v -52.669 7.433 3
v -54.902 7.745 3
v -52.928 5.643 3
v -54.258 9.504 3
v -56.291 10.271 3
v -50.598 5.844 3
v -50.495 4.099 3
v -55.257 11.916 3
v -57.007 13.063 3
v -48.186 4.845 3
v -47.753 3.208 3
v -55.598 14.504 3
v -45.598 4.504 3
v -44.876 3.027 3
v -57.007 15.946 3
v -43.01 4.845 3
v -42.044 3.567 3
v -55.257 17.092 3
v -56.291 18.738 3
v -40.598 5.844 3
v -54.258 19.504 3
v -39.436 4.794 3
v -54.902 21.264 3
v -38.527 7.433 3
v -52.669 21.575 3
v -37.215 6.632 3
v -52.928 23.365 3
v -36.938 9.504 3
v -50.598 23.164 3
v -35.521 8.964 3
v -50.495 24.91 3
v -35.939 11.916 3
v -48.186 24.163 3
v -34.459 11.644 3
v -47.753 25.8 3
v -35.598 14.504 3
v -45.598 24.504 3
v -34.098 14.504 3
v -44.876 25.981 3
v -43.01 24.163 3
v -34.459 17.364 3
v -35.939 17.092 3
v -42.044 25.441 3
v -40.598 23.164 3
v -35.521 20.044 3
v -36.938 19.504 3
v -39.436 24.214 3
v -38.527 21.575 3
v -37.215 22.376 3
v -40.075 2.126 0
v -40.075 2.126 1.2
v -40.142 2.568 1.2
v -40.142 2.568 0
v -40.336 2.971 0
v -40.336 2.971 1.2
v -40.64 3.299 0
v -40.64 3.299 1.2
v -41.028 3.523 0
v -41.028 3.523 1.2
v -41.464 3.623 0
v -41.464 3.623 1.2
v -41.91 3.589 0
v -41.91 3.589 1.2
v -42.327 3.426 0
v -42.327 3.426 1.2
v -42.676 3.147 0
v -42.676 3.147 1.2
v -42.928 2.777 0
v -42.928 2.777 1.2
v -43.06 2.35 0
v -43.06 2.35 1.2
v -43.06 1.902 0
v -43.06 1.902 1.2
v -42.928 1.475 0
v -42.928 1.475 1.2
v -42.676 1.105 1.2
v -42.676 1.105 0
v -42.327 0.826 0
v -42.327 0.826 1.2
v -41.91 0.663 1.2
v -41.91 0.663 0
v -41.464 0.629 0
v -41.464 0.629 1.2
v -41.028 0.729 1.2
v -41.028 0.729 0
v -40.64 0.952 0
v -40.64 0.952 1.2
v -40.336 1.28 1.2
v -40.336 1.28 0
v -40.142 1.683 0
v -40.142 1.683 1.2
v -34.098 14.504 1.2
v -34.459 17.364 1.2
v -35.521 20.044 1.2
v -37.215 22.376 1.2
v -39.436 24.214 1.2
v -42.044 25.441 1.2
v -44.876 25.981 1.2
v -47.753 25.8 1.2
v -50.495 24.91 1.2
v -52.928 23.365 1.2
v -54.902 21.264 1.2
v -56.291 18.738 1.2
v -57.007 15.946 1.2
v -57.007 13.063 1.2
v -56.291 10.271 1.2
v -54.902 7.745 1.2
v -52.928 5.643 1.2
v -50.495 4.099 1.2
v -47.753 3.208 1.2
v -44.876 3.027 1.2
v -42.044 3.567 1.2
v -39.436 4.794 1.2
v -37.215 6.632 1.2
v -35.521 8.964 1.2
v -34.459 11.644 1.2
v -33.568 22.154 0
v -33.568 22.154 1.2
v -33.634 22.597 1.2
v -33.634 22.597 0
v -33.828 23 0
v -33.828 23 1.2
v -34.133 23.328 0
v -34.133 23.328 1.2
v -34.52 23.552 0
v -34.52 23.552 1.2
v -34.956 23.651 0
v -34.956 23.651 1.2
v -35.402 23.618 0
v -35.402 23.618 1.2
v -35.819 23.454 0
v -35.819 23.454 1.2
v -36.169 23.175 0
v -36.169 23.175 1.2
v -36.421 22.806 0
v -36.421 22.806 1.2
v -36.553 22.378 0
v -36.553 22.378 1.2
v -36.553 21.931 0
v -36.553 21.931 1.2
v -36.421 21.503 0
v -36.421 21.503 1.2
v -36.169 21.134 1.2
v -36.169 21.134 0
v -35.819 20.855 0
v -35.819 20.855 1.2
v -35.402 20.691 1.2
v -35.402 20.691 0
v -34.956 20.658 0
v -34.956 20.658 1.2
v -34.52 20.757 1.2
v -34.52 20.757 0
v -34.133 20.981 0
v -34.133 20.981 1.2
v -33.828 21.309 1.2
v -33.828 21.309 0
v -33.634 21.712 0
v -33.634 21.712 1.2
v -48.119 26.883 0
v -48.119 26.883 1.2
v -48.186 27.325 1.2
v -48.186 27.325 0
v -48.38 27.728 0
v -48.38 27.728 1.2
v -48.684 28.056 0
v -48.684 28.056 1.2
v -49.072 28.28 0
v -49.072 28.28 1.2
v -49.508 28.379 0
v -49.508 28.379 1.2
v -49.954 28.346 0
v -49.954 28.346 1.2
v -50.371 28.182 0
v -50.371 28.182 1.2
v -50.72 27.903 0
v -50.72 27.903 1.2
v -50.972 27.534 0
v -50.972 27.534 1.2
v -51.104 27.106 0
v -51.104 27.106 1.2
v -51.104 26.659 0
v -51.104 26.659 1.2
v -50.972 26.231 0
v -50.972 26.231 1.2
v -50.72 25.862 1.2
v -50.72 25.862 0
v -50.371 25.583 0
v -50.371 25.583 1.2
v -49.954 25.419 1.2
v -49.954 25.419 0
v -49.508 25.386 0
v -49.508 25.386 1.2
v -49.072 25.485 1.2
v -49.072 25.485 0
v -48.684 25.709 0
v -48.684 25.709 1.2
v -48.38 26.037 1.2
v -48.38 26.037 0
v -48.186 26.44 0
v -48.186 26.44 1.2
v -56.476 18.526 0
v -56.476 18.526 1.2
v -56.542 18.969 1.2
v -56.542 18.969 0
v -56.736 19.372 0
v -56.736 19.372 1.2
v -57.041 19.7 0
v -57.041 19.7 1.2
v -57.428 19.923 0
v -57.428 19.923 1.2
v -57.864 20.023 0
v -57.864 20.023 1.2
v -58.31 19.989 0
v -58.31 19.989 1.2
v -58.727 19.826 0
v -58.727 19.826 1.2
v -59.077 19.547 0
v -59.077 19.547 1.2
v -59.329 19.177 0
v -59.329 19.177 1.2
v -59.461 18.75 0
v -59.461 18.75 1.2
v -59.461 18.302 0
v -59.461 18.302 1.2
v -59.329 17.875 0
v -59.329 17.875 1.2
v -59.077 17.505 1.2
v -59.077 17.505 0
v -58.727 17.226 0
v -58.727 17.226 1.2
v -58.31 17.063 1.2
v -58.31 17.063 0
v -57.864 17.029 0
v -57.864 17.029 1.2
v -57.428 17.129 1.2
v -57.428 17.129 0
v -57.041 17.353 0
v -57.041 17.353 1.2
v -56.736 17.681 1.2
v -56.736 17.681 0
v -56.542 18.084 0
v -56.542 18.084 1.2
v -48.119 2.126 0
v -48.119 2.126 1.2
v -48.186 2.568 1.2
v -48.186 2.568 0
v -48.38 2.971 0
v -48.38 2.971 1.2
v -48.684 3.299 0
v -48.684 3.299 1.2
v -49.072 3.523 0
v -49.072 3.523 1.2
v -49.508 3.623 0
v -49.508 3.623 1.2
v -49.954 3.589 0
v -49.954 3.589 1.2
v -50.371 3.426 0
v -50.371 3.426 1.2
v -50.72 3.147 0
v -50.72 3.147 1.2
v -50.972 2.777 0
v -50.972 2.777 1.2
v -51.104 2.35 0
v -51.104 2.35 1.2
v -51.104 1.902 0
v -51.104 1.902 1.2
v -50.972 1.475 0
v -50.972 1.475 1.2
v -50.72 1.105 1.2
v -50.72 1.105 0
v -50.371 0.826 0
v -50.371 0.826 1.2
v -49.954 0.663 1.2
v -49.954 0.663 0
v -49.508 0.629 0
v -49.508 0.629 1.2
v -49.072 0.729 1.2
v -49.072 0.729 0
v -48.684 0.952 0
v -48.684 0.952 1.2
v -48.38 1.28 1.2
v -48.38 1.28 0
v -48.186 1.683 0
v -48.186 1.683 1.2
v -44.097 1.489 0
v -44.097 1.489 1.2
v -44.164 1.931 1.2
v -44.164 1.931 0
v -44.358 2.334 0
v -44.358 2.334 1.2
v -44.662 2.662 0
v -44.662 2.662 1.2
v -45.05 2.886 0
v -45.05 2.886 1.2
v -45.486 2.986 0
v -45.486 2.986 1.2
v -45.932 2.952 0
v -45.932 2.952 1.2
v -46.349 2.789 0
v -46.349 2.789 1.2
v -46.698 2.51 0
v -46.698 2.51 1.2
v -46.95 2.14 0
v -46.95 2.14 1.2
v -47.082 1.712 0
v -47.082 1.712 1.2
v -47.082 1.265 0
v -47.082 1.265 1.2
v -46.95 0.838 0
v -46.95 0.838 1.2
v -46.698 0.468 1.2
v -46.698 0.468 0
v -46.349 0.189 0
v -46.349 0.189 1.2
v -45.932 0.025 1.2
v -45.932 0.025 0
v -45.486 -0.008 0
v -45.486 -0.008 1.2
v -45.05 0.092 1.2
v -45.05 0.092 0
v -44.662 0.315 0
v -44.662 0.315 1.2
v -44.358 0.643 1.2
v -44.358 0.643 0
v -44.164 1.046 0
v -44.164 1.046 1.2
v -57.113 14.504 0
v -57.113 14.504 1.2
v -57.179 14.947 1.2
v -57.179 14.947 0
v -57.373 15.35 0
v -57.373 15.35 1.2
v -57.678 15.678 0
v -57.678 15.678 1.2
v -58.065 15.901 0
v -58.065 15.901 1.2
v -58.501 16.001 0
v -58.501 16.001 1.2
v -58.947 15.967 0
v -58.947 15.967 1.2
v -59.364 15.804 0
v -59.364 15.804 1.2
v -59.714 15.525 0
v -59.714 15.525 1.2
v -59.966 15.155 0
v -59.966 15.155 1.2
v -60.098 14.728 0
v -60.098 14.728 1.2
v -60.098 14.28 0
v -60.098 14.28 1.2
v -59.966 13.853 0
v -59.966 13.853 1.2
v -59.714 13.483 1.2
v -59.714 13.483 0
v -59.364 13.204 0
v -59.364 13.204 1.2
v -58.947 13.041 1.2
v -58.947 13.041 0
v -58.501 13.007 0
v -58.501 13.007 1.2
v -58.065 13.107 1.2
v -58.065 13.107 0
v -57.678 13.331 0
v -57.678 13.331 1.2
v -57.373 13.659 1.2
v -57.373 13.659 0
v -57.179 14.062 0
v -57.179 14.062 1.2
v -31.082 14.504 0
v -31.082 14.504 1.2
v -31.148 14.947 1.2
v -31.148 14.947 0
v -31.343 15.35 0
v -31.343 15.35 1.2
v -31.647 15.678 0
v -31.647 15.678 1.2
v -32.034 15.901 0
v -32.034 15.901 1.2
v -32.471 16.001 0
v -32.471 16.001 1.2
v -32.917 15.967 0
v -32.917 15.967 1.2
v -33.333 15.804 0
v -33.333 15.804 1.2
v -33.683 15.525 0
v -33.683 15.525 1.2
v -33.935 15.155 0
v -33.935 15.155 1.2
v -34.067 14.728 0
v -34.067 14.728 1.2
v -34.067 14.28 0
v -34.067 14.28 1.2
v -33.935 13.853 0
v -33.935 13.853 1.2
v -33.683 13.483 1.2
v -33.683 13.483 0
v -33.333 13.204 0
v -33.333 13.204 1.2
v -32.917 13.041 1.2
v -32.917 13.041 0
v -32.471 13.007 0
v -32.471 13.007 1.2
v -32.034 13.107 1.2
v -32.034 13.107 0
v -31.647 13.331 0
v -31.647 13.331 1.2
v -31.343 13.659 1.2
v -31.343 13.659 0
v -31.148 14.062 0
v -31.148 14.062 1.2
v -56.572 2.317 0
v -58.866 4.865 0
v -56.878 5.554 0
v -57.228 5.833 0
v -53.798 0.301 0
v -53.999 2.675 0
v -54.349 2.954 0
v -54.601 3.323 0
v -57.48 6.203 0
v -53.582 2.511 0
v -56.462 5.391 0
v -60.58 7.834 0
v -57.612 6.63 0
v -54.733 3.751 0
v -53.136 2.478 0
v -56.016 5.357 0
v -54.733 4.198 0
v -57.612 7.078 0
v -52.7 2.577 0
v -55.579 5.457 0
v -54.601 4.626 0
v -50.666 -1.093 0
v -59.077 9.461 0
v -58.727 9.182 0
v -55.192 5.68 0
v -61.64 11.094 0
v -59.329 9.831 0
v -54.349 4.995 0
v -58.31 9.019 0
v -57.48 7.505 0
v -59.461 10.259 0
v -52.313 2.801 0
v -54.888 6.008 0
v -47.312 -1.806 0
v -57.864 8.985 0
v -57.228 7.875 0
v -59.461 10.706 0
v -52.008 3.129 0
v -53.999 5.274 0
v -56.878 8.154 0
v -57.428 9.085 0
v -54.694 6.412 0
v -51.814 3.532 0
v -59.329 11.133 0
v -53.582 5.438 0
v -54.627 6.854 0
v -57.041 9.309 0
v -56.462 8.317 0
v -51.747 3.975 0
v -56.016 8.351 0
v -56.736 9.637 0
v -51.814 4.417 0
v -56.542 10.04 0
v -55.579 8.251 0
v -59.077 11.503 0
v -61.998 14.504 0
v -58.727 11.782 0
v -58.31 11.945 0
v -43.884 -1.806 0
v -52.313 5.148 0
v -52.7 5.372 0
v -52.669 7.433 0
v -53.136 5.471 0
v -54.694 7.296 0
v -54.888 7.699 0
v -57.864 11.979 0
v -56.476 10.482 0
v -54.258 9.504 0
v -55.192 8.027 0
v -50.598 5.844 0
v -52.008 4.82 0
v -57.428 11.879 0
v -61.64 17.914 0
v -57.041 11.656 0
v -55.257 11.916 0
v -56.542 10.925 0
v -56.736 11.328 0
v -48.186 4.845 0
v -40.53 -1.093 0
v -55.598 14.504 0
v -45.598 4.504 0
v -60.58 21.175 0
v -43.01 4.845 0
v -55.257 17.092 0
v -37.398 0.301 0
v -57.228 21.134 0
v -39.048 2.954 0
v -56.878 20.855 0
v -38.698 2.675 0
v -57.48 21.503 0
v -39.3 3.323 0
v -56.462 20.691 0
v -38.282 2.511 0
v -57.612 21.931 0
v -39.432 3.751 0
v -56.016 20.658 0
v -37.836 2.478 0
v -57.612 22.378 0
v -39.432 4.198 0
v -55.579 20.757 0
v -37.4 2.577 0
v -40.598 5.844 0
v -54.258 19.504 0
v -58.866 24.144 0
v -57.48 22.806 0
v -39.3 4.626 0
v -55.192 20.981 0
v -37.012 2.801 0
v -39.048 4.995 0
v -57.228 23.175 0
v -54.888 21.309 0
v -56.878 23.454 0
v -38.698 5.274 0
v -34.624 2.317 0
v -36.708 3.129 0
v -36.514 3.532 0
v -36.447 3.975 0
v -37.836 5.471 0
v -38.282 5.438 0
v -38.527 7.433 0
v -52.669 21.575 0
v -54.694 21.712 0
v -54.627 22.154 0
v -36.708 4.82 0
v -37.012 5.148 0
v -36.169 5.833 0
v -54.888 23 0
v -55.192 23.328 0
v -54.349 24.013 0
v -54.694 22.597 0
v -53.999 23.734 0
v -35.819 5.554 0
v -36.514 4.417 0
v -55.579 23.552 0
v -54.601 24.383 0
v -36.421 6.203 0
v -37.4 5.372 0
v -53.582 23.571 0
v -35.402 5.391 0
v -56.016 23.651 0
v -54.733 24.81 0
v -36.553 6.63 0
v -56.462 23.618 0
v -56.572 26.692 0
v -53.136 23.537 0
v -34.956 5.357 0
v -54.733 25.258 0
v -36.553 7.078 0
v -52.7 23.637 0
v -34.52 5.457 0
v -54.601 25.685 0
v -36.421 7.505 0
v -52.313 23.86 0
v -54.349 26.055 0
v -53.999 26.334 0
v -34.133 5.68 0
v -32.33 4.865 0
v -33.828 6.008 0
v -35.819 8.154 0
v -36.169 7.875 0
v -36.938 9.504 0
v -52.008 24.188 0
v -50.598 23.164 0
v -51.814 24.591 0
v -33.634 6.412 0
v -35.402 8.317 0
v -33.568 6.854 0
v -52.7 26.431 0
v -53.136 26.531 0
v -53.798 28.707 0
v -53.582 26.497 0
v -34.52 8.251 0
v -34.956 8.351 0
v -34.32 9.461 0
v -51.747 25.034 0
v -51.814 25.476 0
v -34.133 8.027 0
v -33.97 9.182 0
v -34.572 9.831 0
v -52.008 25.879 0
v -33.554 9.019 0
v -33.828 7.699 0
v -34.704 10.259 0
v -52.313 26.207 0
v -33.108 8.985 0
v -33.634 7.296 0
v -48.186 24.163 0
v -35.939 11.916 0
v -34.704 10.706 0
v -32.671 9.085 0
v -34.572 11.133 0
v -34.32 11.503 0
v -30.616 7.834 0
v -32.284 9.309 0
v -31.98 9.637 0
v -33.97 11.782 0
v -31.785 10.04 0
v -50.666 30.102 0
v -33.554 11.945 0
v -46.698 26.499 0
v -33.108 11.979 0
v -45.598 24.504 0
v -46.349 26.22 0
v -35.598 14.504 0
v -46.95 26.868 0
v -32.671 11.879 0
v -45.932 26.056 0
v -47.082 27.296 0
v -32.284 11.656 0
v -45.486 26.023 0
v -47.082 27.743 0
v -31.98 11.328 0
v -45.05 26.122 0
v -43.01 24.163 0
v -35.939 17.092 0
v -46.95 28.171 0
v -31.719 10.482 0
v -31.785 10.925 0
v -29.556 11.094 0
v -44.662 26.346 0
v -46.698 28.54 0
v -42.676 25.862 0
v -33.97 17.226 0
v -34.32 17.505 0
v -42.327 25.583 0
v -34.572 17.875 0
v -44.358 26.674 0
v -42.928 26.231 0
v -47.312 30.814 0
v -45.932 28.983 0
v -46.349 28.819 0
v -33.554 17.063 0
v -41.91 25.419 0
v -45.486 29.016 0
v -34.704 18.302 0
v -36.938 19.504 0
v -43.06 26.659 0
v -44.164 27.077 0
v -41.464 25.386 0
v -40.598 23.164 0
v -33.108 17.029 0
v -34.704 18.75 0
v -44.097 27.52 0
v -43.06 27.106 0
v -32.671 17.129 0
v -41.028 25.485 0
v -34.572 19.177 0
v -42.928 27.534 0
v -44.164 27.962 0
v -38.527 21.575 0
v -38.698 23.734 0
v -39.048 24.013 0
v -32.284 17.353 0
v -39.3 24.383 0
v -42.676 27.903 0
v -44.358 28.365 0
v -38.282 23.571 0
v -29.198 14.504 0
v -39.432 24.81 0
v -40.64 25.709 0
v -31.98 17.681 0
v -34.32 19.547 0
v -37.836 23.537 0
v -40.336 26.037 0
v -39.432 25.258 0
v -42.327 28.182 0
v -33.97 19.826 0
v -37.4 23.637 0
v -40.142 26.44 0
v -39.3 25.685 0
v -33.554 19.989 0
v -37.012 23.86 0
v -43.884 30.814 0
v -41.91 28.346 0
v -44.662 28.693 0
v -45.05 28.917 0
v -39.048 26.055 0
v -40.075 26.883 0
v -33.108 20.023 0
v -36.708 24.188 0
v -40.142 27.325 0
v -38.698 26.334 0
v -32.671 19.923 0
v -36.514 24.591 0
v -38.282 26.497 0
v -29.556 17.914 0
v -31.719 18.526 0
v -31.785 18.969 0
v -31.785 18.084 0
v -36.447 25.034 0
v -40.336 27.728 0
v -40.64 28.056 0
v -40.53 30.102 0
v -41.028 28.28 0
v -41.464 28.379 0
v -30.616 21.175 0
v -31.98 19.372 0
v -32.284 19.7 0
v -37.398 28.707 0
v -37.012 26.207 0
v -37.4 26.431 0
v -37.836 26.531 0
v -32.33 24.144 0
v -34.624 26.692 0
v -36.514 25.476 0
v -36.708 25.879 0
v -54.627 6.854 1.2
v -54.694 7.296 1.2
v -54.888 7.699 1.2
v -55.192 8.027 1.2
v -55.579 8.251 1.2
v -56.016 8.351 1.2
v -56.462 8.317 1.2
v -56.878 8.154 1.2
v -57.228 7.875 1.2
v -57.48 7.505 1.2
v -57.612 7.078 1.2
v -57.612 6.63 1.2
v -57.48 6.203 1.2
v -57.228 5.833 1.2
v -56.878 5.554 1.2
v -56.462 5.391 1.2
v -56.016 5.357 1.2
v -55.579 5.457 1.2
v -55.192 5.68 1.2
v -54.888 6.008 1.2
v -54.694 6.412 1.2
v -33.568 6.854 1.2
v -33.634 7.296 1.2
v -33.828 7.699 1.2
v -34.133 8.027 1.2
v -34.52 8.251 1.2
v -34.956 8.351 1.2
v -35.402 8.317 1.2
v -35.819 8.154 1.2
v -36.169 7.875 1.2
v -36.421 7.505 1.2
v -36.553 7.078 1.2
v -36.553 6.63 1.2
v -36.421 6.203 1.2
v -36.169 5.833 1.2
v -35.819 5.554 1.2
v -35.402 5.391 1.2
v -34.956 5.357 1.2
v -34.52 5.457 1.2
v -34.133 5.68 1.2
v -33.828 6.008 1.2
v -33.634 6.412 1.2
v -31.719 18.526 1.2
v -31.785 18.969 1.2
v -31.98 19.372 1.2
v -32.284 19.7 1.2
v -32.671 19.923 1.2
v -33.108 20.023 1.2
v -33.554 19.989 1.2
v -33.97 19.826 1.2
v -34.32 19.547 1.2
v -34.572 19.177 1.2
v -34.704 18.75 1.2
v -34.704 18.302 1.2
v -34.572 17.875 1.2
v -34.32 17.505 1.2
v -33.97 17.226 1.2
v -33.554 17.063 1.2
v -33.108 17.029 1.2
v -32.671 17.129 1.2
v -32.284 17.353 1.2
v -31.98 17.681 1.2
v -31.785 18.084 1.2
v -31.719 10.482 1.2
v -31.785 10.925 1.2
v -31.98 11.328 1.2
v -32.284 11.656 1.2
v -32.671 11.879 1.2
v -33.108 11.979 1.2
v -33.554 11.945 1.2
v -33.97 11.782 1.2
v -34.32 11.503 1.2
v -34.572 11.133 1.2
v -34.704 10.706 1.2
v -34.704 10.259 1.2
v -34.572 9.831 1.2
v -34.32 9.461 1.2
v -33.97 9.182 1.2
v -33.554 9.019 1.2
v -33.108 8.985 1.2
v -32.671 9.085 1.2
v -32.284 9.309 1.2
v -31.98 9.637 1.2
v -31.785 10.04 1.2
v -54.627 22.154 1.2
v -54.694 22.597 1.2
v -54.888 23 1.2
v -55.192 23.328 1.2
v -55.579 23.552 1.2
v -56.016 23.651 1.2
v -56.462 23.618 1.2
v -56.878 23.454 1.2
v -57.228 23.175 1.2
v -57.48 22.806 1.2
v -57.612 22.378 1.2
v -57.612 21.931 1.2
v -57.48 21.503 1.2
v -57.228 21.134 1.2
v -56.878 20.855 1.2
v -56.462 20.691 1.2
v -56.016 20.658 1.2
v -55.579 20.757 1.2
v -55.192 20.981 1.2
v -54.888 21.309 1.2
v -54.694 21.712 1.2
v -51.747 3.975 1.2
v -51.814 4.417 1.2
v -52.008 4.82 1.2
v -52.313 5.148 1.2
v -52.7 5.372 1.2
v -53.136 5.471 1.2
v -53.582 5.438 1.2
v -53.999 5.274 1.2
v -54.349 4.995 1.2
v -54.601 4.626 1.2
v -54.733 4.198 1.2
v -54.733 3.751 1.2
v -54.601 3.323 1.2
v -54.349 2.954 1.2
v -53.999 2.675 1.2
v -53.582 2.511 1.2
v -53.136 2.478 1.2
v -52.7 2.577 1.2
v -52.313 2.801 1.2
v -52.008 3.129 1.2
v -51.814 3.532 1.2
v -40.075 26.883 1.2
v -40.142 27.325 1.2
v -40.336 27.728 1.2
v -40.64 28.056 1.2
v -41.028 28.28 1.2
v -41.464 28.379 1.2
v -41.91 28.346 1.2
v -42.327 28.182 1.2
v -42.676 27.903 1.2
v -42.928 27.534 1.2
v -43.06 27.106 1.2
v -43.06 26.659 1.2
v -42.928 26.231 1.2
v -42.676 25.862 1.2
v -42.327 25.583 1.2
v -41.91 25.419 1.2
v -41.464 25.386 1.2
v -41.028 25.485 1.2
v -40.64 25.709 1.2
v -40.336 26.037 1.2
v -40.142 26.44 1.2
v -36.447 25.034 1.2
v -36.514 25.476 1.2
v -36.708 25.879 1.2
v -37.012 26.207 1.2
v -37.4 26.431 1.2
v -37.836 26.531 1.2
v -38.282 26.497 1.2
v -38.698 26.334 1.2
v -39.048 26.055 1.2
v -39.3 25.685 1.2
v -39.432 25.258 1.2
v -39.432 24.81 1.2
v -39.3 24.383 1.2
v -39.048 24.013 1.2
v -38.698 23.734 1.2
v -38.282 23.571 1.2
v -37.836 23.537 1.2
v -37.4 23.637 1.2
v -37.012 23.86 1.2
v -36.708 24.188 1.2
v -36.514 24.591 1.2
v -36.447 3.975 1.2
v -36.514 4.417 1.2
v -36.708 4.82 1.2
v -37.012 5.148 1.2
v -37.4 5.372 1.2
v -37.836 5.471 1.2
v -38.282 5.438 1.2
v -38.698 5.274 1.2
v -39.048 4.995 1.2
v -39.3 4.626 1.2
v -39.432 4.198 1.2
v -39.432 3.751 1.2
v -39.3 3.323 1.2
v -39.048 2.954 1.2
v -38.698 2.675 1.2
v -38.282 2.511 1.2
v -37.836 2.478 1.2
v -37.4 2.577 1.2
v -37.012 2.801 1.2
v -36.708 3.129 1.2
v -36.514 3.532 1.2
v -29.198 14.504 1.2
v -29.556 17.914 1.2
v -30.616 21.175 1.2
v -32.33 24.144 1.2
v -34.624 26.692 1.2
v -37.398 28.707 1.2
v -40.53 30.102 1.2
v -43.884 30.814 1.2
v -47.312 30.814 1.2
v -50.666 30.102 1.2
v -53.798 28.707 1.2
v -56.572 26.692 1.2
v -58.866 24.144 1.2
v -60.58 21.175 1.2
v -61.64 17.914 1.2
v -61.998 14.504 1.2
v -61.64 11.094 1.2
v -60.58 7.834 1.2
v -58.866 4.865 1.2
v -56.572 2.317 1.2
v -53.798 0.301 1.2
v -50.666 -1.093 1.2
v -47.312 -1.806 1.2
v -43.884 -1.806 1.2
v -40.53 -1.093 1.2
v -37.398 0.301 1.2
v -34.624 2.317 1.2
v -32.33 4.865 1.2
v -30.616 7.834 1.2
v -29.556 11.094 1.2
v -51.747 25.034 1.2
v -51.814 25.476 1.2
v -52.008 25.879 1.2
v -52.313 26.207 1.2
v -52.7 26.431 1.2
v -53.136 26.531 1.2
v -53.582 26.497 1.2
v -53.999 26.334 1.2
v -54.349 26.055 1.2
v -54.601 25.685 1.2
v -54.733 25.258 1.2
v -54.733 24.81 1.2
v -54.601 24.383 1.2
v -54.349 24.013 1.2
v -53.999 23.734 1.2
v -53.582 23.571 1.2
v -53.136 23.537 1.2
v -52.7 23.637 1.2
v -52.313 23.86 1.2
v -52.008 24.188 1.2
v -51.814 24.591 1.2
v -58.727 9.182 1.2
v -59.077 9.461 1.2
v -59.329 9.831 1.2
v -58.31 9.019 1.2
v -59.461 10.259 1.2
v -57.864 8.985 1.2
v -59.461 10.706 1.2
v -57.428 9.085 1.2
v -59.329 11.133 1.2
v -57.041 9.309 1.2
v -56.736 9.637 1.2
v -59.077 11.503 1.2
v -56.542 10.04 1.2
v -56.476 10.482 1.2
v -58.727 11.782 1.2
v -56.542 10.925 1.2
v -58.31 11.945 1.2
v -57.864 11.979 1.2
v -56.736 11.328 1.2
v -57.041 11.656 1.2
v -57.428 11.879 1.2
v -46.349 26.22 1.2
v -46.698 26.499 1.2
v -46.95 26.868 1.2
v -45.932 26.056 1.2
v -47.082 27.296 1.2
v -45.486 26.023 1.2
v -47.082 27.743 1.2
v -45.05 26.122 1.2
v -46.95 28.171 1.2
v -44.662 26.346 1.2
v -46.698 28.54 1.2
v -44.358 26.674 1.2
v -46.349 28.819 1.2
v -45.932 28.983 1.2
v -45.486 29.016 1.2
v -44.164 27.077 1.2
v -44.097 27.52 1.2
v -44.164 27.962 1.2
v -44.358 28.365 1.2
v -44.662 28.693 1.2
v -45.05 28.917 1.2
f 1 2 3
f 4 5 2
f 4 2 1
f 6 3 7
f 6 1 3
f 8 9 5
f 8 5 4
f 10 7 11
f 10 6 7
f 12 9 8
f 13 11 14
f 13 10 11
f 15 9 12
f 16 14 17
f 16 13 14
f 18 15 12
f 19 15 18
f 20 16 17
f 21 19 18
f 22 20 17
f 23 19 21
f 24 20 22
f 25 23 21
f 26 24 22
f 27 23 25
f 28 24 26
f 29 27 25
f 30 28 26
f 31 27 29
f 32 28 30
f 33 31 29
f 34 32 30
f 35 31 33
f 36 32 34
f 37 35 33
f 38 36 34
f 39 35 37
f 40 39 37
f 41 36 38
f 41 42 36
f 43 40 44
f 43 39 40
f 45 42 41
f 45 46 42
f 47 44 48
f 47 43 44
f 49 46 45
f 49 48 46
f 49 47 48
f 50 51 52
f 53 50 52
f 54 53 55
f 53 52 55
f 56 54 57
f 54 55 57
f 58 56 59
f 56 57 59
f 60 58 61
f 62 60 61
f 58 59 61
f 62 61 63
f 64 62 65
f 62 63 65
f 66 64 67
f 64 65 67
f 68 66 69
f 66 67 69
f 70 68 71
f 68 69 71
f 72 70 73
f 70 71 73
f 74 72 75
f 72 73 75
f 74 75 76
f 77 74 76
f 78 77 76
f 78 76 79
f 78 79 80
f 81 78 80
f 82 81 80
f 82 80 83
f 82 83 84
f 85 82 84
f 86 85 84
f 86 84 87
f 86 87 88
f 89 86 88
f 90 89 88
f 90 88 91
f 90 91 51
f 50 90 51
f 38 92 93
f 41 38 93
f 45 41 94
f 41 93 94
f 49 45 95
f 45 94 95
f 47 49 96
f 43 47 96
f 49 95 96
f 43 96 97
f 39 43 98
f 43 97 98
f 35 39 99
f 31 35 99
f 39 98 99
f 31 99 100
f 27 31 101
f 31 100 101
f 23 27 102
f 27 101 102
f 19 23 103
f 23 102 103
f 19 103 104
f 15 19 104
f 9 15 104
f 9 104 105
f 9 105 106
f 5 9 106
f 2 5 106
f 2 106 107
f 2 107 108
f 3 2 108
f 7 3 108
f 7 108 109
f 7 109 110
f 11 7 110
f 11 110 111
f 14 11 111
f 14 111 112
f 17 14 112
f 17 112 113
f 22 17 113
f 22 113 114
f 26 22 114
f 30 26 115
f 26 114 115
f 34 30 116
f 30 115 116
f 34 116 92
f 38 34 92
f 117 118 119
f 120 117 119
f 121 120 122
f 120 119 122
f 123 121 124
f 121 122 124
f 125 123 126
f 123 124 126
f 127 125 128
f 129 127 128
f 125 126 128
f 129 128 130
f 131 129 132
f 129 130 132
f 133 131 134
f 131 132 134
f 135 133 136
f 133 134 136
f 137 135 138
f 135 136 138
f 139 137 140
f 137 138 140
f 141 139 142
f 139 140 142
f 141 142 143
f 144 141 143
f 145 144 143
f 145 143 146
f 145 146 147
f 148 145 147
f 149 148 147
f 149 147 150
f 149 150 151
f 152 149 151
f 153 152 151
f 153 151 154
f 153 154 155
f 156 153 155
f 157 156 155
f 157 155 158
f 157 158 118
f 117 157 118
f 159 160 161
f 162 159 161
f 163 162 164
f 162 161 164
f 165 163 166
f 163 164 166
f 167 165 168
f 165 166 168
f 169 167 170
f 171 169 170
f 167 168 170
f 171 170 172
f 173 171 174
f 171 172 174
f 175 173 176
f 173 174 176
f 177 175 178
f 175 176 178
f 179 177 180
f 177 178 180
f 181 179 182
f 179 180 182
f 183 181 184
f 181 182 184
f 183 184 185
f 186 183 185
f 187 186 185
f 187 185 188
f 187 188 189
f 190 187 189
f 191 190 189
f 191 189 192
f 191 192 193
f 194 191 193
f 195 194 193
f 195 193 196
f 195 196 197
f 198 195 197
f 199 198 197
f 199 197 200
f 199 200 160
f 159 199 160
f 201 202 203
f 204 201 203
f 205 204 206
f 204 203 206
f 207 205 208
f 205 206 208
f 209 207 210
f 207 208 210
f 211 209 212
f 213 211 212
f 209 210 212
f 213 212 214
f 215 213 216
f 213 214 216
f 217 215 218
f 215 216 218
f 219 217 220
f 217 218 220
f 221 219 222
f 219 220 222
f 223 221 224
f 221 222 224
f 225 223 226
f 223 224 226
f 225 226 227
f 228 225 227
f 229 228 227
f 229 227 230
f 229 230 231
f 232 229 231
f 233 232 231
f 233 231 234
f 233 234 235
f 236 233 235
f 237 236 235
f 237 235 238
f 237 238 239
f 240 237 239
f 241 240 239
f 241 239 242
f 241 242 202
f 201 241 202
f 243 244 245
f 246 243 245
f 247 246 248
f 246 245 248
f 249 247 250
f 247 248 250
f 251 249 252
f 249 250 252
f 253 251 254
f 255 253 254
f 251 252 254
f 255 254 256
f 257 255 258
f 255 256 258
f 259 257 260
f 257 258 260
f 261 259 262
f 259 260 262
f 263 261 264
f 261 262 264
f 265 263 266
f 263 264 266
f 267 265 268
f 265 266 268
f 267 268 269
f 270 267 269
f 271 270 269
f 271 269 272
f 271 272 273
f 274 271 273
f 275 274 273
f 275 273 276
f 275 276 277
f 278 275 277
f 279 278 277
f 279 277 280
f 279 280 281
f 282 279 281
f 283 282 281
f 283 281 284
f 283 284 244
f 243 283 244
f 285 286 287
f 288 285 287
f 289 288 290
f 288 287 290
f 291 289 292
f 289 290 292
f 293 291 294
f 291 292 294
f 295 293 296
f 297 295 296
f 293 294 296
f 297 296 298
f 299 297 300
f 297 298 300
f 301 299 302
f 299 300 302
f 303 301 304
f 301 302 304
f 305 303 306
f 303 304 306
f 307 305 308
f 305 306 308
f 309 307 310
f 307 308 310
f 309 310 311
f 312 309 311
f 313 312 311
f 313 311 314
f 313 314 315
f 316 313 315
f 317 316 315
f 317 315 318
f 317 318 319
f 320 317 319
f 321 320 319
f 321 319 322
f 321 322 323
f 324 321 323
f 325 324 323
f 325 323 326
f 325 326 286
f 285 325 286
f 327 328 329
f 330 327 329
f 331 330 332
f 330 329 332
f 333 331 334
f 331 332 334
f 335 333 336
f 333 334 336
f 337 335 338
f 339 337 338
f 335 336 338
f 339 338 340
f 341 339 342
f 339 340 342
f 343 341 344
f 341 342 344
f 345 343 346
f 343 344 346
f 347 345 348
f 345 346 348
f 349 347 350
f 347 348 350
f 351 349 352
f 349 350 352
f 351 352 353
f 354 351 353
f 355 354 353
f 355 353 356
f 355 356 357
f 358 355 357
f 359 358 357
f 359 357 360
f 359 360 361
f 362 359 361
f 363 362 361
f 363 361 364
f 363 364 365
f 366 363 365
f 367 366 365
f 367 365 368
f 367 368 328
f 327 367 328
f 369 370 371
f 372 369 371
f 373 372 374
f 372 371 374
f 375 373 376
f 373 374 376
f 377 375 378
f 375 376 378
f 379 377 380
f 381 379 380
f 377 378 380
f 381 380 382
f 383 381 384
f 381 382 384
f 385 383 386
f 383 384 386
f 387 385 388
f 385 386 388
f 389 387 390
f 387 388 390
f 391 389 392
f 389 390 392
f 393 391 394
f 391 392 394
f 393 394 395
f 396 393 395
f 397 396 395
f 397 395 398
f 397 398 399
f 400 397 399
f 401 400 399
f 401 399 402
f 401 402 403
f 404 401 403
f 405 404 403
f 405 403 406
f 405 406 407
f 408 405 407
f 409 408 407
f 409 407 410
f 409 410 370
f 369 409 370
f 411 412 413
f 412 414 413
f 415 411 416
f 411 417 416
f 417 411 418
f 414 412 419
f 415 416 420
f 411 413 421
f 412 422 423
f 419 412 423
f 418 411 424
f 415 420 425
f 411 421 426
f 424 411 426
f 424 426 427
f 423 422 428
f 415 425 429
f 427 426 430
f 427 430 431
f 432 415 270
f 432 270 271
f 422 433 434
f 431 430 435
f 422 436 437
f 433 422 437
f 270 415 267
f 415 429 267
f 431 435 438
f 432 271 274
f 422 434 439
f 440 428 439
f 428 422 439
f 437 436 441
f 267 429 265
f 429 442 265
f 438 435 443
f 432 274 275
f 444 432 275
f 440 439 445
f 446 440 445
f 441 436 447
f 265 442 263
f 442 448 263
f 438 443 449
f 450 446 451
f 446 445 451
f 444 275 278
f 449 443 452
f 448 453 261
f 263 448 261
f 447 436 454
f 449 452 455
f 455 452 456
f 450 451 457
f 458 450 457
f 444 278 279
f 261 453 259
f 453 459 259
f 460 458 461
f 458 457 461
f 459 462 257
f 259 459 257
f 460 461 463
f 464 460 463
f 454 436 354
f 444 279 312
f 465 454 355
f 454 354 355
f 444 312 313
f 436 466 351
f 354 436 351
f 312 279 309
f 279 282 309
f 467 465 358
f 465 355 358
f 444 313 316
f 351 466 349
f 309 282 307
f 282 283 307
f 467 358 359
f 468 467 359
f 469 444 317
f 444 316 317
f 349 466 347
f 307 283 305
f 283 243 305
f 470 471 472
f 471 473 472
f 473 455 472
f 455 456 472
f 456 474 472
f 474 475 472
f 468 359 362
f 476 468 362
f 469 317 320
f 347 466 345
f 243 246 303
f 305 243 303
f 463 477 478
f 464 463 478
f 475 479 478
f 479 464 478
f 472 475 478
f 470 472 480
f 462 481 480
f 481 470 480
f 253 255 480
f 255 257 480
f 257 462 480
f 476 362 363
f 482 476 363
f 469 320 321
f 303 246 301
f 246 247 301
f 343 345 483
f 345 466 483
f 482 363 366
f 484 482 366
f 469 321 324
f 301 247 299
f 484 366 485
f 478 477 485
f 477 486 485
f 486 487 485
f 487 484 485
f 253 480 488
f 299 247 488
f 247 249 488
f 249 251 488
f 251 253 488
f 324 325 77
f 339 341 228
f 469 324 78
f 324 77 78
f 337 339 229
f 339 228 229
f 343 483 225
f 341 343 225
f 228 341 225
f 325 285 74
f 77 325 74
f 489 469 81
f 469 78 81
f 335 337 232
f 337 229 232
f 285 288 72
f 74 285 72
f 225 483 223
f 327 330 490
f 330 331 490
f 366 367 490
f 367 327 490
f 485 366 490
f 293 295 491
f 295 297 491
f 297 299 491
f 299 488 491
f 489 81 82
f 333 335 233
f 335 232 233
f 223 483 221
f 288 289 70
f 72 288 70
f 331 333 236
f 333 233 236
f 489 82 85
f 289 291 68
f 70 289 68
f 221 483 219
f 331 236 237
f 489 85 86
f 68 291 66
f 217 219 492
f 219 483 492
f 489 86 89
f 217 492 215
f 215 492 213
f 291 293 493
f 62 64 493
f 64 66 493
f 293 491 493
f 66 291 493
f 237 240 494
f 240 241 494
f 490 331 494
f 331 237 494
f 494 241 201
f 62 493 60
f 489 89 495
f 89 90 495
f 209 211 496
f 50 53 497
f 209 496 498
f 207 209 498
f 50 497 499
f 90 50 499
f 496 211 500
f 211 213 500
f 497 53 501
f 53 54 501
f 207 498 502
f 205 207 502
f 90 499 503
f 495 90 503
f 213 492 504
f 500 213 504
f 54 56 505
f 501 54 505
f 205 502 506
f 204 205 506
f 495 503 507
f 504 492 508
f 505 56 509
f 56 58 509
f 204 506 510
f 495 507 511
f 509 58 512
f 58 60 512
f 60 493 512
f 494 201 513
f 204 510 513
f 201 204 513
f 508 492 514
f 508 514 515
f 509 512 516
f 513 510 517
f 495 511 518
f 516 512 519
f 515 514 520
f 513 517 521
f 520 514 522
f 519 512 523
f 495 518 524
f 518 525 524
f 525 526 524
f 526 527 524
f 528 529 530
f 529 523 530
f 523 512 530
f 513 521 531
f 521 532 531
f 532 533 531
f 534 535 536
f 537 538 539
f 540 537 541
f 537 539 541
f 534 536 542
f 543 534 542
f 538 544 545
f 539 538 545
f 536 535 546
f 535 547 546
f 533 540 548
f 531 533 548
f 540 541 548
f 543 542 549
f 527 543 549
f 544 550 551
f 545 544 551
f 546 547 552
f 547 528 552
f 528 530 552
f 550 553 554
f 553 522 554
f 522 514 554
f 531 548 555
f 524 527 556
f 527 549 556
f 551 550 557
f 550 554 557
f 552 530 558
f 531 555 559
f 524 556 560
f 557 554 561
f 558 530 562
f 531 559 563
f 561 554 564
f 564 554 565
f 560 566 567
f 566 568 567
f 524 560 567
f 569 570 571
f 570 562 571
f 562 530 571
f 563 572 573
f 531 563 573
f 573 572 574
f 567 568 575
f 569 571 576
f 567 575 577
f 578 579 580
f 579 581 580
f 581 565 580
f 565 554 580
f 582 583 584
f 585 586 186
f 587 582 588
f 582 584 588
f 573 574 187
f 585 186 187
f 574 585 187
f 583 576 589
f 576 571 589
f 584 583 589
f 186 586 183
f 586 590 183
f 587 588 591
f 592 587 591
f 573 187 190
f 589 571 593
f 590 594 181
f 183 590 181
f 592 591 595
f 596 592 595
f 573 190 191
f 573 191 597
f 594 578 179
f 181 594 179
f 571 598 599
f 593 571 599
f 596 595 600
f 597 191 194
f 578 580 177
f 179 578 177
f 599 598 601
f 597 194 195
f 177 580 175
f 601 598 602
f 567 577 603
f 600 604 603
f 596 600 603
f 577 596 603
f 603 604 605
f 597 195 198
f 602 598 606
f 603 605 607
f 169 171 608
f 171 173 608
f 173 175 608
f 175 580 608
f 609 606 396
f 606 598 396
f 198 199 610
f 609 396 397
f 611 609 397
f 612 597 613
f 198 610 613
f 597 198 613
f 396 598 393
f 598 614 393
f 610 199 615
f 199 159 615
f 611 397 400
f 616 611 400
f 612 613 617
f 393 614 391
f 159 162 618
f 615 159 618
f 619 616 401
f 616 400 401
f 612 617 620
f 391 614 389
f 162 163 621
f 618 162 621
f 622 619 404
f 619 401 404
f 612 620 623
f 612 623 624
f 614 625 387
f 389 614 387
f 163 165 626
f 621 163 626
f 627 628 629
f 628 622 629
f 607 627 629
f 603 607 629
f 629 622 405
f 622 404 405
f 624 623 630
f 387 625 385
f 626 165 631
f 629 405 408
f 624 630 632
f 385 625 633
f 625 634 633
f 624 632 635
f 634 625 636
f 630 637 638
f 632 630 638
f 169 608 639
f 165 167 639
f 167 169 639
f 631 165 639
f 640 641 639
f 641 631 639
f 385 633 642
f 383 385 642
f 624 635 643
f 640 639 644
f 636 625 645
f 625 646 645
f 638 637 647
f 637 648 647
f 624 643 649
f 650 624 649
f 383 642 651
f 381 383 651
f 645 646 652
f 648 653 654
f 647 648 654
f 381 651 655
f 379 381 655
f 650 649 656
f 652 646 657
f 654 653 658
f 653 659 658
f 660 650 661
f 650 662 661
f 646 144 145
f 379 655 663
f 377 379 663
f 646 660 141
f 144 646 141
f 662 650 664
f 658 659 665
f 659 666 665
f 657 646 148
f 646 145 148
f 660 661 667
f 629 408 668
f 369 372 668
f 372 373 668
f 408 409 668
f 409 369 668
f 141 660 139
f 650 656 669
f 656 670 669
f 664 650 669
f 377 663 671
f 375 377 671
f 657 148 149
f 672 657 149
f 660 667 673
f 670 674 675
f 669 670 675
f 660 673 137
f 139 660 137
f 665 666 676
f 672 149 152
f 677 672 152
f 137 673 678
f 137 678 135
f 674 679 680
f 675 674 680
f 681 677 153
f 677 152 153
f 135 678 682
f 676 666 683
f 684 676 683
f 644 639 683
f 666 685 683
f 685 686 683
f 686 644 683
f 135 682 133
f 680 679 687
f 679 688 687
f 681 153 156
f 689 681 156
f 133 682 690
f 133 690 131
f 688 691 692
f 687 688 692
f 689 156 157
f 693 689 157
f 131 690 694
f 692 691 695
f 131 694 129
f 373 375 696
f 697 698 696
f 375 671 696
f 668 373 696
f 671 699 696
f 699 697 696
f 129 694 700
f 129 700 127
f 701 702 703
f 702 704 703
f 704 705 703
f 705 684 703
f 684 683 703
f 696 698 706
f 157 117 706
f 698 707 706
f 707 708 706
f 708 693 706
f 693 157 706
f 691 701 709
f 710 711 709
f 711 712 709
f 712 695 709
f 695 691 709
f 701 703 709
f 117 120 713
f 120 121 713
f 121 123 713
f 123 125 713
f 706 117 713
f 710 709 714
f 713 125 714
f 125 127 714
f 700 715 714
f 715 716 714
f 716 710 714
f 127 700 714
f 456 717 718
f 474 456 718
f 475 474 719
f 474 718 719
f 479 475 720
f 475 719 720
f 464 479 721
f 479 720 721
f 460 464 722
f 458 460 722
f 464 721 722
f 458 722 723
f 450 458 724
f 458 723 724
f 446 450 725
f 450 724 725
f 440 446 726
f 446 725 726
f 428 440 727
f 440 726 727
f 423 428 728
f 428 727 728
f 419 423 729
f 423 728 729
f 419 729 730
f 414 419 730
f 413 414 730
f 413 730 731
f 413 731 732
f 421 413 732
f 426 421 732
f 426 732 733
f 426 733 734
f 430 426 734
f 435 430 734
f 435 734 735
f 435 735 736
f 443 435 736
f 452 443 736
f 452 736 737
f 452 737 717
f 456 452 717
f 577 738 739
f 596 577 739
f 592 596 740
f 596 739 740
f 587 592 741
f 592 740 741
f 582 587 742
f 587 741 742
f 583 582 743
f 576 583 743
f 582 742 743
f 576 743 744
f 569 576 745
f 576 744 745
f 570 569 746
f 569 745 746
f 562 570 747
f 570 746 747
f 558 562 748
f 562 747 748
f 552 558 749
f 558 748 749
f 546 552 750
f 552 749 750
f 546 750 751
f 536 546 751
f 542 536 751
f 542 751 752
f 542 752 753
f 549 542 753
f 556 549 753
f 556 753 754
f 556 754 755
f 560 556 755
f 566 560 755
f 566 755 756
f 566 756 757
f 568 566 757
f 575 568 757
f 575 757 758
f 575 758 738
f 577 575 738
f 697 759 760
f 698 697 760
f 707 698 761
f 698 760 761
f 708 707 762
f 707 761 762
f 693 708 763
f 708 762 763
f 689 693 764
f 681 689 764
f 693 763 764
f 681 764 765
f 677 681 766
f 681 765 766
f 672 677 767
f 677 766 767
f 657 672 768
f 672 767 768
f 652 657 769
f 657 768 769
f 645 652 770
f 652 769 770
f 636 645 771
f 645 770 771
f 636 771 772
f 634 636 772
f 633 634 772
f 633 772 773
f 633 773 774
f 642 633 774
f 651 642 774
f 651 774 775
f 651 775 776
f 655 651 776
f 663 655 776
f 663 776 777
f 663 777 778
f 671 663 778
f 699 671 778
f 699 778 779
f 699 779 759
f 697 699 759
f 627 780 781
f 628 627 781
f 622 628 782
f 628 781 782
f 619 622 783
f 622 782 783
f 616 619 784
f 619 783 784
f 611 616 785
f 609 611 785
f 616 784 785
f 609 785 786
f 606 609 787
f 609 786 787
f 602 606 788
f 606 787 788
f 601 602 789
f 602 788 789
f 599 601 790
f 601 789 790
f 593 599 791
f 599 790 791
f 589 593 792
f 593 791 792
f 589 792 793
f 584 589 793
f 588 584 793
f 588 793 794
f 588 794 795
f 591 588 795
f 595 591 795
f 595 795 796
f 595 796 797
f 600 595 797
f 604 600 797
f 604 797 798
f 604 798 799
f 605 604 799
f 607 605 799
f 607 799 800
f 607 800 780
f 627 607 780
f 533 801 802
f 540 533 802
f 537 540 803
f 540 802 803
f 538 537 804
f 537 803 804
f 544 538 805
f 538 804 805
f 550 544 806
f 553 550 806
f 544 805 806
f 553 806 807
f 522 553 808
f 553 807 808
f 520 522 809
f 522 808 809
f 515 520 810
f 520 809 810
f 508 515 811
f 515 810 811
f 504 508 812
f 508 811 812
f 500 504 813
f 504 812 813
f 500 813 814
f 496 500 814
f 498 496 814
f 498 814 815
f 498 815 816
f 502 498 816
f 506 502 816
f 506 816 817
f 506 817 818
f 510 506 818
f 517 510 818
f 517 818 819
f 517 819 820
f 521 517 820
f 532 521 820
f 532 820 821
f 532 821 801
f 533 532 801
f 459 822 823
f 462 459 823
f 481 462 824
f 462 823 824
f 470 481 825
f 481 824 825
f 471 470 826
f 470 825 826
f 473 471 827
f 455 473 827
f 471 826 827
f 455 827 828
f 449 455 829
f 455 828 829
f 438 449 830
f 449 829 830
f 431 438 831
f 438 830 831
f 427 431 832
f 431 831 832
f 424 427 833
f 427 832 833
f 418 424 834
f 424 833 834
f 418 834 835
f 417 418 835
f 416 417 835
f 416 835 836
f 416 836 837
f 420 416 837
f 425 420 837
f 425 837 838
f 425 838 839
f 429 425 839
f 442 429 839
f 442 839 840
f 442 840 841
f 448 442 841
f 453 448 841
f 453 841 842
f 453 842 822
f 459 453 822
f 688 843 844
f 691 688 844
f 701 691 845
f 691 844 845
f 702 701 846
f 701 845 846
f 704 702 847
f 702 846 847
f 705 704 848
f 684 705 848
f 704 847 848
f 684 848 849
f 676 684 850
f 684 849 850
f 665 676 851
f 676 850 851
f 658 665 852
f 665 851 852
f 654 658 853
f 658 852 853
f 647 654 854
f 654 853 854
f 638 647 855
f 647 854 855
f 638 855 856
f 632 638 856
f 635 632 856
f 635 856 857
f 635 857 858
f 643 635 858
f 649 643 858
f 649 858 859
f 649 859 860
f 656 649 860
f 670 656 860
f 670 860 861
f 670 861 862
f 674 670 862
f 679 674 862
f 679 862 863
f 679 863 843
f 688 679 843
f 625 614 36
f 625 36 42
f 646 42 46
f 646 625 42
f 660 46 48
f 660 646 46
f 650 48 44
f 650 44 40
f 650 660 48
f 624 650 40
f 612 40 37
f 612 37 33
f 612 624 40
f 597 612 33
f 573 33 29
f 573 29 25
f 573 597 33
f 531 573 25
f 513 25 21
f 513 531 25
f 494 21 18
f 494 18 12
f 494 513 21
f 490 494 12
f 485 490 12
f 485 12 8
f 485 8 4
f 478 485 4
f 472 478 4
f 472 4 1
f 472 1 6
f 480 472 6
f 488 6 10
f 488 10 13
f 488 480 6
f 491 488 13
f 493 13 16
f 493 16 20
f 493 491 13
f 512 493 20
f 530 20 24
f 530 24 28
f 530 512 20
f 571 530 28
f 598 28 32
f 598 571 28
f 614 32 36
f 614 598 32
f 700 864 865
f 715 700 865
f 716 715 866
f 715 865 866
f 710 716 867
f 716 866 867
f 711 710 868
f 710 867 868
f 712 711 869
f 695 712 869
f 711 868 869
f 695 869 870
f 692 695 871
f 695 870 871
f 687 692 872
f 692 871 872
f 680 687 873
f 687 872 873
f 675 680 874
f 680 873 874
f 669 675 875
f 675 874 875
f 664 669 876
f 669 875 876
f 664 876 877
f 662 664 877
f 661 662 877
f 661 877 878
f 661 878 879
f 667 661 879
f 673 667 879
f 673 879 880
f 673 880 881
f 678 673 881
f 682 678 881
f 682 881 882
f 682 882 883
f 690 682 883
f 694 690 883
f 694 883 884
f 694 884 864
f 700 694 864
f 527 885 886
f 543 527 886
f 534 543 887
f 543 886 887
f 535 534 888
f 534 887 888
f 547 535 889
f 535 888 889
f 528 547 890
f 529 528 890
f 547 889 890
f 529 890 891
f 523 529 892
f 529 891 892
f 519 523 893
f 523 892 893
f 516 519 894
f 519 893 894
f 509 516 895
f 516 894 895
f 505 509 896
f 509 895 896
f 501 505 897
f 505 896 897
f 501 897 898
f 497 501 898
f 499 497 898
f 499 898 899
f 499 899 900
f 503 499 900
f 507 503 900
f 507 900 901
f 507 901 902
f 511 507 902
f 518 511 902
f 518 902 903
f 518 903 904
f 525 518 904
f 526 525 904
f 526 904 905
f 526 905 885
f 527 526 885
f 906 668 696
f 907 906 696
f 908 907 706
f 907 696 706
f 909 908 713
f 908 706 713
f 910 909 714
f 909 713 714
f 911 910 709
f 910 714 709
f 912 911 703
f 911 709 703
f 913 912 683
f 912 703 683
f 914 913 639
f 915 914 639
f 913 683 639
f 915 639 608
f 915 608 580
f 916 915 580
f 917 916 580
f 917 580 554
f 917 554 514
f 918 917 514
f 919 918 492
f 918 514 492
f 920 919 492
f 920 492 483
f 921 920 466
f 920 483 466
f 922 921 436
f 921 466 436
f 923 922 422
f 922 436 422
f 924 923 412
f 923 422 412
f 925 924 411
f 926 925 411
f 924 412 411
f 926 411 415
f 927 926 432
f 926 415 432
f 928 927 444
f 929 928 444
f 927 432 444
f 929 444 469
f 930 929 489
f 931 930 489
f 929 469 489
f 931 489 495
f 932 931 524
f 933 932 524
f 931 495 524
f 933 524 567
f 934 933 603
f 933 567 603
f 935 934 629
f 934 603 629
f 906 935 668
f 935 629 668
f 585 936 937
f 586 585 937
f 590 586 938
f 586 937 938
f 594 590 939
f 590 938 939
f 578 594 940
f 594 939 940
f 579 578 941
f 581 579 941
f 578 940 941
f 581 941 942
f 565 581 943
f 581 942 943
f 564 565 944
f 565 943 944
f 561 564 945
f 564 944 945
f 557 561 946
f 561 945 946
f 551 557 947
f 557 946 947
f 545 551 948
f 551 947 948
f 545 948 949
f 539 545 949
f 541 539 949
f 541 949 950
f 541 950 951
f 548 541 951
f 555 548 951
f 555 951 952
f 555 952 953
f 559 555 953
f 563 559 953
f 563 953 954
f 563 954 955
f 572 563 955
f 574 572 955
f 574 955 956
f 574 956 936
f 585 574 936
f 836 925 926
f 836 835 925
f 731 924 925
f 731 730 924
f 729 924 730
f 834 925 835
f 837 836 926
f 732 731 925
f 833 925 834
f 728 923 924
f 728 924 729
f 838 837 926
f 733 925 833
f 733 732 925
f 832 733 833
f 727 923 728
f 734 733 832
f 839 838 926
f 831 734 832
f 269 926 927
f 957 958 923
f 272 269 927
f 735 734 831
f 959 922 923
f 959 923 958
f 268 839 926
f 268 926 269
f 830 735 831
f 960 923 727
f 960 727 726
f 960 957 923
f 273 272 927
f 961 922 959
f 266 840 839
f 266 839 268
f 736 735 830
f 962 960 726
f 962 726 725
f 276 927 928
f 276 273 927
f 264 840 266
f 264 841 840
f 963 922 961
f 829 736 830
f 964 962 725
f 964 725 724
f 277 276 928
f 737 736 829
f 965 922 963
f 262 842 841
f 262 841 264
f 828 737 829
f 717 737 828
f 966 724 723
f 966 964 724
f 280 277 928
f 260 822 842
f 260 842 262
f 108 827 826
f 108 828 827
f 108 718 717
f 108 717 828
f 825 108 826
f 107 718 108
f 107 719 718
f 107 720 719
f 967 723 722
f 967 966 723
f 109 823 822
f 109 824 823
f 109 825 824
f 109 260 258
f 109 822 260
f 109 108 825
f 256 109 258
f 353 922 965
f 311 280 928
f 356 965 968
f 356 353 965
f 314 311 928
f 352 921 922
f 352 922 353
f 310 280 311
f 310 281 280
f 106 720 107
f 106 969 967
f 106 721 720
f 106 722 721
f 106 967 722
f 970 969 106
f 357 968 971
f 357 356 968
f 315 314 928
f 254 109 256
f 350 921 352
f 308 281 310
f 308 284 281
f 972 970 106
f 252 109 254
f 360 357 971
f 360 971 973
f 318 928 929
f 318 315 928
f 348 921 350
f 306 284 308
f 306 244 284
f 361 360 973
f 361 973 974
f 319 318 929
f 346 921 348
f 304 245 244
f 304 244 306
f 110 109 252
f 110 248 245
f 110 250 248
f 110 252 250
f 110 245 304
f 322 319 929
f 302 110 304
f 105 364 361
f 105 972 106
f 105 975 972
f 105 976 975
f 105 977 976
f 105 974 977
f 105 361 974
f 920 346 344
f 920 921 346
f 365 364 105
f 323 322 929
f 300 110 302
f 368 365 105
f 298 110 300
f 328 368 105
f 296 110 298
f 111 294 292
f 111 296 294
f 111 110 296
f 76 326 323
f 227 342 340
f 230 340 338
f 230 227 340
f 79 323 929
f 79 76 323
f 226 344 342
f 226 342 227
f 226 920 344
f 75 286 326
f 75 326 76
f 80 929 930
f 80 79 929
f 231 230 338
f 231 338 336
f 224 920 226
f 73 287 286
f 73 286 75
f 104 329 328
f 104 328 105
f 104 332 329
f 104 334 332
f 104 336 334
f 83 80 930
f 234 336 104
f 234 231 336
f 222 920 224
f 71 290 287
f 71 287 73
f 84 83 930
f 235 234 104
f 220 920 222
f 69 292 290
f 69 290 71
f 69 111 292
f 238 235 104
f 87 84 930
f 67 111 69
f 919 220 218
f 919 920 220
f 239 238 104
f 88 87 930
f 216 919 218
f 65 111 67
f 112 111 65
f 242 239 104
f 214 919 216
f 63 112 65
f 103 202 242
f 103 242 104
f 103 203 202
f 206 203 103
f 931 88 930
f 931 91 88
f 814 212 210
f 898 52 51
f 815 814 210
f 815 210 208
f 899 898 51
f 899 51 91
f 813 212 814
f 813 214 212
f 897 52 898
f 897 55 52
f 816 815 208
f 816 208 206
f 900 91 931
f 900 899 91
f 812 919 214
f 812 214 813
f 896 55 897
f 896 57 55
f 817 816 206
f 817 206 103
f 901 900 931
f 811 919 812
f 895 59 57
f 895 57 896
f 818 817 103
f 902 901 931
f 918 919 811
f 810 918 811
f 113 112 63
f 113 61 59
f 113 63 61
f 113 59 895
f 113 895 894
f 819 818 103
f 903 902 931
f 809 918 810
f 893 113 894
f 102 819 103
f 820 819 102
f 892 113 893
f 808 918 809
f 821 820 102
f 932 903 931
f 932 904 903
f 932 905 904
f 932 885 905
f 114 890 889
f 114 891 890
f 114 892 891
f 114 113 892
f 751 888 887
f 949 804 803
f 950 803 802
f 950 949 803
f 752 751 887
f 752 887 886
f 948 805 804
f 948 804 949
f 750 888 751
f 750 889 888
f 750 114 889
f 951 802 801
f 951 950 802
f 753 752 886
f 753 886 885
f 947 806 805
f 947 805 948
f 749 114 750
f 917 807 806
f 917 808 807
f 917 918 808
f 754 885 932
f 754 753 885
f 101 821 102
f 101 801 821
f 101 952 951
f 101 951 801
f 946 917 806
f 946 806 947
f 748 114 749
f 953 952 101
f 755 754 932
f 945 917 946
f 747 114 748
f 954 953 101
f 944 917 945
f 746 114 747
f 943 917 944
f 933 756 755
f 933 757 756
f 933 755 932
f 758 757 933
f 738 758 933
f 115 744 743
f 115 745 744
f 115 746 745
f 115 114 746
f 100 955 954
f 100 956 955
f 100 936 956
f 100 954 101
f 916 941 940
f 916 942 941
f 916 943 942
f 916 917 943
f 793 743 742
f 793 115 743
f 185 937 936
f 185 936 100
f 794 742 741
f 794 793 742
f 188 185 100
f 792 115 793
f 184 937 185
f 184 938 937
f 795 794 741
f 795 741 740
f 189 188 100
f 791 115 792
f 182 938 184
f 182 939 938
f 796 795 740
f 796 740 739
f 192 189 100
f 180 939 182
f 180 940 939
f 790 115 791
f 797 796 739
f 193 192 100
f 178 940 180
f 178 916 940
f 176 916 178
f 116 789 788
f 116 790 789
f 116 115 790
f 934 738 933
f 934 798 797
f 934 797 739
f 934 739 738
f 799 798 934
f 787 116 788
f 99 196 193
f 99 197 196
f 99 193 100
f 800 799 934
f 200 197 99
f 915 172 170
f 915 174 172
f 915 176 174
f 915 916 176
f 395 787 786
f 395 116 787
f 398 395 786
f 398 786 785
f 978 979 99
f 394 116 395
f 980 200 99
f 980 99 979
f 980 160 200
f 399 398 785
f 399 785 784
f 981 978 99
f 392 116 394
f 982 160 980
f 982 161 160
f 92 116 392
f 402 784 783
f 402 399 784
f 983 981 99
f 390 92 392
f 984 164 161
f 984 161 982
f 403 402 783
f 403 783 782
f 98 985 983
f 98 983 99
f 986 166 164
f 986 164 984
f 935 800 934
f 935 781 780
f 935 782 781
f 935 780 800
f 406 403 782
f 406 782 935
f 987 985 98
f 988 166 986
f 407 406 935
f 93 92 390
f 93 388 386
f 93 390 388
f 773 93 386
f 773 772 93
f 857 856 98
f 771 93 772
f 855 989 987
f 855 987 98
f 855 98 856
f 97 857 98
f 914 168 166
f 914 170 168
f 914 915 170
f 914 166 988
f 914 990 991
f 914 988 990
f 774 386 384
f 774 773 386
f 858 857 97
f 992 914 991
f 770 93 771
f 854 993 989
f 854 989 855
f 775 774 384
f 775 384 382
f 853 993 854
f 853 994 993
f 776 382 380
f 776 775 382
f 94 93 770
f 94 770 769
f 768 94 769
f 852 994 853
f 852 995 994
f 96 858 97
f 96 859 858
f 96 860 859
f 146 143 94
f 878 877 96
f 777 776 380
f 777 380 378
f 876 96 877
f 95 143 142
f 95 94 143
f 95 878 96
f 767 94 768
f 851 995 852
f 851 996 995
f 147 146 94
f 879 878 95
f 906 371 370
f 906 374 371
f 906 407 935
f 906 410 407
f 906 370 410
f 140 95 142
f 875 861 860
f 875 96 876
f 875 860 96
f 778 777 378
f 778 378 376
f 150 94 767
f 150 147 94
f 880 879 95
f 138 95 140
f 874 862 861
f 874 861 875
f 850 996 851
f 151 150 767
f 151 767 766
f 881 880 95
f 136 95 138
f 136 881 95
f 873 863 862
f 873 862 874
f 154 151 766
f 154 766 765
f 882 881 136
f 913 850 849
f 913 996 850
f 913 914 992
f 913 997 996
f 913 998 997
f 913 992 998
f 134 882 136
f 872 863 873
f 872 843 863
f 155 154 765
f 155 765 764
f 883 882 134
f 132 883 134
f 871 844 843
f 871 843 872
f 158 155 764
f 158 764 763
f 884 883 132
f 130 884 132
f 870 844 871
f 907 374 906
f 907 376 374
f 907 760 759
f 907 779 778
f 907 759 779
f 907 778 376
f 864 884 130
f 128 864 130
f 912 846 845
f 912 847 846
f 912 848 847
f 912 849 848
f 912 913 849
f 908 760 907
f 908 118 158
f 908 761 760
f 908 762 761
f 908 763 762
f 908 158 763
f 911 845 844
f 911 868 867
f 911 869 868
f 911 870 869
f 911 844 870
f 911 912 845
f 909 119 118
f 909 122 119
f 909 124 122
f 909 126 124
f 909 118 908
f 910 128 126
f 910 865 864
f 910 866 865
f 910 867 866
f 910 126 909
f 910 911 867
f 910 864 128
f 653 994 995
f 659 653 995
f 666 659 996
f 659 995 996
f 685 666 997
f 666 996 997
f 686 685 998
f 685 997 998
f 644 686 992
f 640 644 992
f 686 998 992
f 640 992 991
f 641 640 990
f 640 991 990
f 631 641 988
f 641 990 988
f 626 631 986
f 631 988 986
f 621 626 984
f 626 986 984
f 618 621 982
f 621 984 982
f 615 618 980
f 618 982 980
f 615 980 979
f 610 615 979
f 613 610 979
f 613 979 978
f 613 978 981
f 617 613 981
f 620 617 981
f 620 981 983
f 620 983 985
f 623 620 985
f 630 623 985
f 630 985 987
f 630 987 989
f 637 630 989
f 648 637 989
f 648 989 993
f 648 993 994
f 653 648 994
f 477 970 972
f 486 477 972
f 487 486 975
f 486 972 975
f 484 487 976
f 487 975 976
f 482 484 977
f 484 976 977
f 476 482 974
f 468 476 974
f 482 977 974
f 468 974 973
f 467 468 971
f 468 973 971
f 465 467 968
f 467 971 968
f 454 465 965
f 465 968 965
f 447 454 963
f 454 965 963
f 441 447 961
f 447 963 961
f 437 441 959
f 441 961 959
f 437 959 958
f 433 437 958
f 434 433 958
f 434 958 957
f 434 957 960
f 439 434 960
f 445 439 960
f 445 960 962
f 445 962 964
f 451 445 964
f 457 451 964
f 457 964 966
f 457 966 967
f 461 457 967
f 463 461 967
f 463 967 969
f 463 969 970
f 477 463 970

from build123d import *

# Parameters (mm, degrees)
F0_R     = 16.4
F0_R_2   = 11.5
F1_DEPTH = 1.2
F0_R_3   = 10
F2_DEPTH = 3
F3_R     = 1.500919
F4_DEPTH = 25


with BuildPart() as f1:
    # F0 (on Top) → F1 (new body)
    with BuildSketch(Plane.XY):
        with Locations((-45.598116, 14.504182)):
            Circle(F0_R)
        with Locations((-45.598116, 14.504182)):
            Circle(F0_R_2, mode=Mode.SUBTRACT)
    extrude(amount=F1_DEPTH)

    # F0 (on Top) → F2 (join)
    with BuildSketch(Plane.XY):
        with Locations((-45.598116, 14.504182)):
            Circle(F0_R_2)
        with Locations((-45.598116, 14.504182)):
            Circle(F0_R_3, mode=Mode.SUBTRACT)
    extrude(amount=F2_DEPTH)

    # F3 (on face) → F4 (cut)
    with BuildSketch(Plane.XY.offset(1.2)):
        with Locations((-45.598116, 27.51958)):
            Circle(F3_R)
        with Locations((-49.620095, 26.882561)):
            Circle(F3_R)
        with Locations((-53.248375, 25.03386)):
            Circle(F3_R)
        with Locations((-56.127794, 22.154441)):
            Circle(F3_R)
        with Locations((-57.976495, 18.526161)):
            Circle(F3_R)
        with Locations((-58.613514, 14.504182)):
            Circle(F3_R)
        with Locations((-57.976495, 10.482203)):
            Circle(F3_R)
        with Locations((-56.127794, 6.853923)):
            Circle(F3_R)
        with Locations((-53.248375, 3.974504)):
            Circle(F3_R)
        with Locations((-49.620095, 2.125803)):
            Circle(F3_R)
        with Locations((-45.598116, 1.488784)):
            Circle(F3_R)
        with Locations((-41.576137, 2.125803)):
            Circle(F3_R)
        with Locations((-37.947857, 3.974504)):
            Circle(F3_R)
        with Locations((-35.068438, 6.853923)):
            Circle(F3_R)
        with Locations((-33.219737, 10.482203)):
            Circle(F3_R)
        with Locations((-32.582718, 14.504182)):
            Circle(F3_R)
        with Locations((-33.219737, 18.526161)):
            Circle(F3_R)
        with Locations((-35.068438, 22.154441)):
            Circle(F3_R)
        with Locations((-37.947857, 25.03386)):
            Circle(F3_R)
        with Locations((-41.576137, 26.882561)):
            Circle(F3_R)
    extrude(amount=-F4_DEPTH, mode=Mode.SUBTRACT)


solid = f1.part
